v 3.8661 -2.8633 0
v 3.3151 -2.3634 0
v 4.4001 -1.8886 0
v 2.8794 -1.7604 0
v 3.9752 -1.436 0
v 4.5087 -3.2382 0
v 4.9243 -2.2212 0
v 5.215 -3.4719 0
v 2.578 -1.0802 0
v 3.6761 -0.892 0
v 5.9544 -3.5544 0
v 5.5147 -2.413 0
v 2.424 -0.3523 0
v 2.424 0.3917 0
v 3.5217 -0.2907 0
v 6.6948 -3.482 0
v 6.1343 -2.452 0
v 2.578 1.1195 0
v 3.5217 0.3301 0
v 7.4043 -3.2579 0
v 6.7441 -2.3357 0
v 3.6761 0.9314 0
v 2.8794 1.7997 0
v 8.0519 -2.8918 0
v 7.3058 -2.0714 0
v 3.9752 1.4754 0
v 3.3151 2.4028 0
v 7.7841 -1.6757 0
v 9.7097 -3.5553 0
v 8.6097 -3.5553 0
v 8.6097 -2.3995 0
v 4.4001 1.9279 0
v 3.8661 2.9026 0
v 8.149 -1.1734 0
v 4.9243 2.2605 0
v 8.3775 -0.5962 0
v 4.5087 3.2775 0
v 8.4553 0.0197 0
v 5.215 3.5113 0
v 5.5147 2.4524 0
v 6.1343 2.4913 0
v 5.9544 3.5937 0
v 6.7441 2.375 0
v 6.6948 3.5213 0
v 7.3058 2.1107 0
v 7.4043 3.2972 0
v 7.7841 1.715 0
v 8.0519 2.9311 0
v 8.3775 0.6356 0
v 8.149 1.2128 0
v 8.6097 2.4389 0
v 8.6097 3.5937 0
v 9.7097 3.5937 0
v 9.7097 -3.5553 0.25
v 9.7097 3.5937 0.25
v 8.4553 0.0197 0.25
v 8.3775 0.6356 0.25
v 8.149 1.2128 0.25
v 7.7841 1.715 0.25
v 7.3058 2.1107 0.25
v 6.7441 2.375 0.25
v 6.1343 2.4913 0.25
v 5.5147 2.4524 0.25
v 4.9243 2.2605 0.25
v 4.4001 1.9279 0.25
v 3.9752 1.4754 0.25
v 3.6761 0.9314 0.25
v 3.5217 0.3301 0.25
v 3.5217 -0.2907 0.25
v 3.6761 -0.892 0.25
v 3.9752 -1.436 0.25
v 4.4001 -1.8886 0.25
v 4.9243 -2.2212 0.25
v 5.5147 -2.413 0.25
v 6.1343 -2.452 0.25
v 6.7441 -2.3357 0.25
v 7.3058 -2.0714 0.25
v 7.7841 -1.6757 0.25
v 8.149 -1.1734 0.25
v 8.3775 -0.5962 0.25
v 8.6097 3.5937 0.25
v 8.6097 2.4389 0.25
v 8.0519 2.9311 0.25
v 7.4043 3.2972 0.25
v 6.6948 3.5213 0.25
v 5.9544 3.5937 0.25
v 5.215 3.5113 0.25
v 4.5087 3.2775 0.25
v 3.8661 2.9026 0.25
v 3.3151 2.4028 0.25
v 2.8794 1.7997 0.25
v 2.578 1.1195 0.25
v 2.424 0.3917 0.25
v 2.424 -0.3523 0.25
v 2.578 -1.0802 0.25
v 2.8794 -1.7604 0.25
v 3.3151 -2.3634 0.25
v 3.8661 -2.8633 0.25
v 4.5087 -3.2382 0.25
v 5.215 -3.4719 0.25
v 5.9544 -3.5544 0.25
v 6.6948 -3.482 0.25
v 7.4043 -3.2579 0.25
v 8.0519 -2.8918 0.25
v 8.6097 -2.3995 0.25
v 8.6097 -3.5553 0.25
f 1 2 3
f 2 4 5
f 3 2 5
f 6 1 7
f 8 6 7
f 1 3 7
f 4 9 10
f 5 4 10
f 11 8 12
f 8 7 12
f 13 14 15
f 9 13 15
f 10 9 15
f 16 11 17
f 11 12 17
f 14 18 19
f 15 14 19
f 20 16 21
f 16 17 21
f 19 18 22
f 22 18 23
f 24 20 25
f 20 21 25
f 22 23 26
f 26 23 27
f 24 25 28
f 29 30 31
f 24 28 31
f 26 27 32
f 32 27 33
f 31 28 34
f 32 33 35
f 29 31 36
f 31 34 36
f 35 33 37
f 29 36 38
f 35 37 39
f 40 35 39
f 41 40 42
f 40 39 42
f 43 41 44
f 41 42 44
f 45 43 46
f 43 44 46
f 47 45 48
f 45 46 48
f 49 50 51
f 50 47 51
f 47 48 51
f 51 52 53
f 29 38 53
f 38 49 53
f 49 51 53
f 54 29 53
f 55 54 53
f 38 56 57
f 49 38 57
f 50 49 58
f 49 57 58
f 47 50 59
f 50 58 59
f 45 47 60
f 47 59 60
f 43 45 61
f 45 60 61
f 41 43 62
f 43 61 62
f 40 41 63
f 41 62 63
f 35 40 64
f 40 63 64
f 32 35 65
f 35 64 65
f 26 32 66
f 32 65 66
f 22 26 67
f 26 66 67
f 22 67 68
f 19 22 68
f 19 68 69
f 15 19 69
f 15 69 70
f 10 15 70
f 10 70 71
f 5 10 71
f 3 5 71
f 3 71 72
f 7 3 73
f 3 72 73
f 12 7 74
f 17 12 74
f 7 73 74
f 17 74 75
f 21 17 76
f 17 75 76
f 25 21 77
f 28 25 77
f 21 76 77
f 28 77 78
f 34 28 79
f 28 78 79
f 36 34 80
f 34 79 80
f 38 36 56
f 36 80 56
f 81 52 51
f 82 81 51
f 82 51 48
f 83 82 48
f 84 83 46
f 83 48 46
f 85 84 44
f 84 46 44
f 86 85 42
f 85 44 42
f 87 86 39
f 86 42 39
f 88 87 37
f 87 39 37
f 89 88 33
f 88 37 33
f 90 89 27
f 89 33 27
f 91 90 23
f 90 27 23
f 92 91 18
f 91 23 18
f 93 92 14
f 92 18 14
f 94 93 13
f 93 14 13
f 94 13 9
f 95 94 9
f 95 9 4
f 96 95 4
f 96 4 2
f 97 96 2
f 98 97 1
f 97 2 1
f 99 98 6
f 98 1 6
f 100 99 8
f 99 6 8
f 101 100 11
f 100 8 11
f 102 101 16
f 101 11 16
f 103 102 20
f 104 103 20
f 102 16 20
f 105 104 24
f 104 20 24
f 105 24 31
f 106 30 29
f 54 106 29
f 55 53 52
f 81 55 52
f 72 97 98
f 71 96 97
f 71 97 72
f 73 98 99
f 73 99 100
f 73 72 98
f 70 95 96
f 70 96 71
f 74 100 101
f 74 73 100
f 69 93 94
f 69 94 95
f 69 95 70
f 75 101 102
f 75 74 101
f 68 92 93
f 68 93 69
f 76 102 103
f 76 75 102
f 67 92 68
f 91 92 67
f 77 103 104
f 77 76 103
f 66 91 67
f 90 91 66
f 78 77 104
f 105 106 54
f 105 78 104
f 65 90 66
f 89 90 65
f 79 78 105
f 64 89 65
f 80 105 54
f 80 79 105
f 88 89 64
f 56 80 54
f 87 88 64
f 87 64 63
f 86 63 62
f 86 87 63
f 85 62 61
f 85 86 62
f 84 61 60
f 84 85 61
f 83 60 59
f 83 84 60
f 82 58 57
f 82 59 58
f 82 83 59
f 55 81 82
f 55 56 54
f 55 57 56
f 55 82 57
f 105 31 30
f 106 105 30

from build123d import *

# Parameters (mm, degrees)
F0_R     = 2.474548
F1_DEPTH = 0.25
F2_DEPTH = 0.25
F3_R     = 2.476563
F4_DEPTH = 0.25


with BuildPart() as f1:
    # F0 (on Top) → F1 (new body)
    with BuildSketch(Plane.XY):
        with BuildLine():
            Line((8.609738, -2.39951), (8.609738, 2.438852))
            ThreePointArc((8.609738, 2.438852), (2.404608, 0.019671), (8.609738, -2.39951))
        make_face()
        with Locations((5.978753, 0.019671)):
            Circle(F0_R, mode=Mode.SUBTRACT)
        with Locations((5.978753, 0.019671)):
            Circle(F0_R)
        with BuildLine():
            ThreePointArc((8.609738, -2.39951), (9.308771, -1.278596), (9.552899, 0.019671))
            ThreePointArc((9.552899, 0.019671), (9.308771, 1.317938), (8.609738, 2.438852))
            Line((8.609738, 2.438852), (8.609738, -2.39951))
        make_face()
    extrude(amount=F1_DEPTH)

    # F0 (on Top) → F2 (join)
    with BuildSketch(Plane.XY):
        with BuildLine():
            ThreePointArc((8.609738, 2.438852), (9.308771, 1.317938), (9.552899, 0.019671))
            ThreePointArc((9.552899, 0.019671), (9.308771, -1.278596), (8.609738, -2.39951))
            Line((8.609738, -2.39951), (8.609738, -3.555269))
            Line((8.609738, -3.555269), (9.709738, -3.555269))
            Line((9.709738, -3.555269), (9.709738, 3.593735))
            Line((9.709738, 3.593735), (8.609738, 3.593735))
            Line((8.609738, 3.593735), (8.609738, 2.438852))
        make_face()
    extrude(amount=F2_DEPTH)

    # F3 (on face) → F4 (cut)
    with BuildSketch(Plane.XY.offset(0.25)):
        with Locations((5.978753, 0.019671)):
            Circle(F3_R)
    extrude(amount=-F4_DEPTH, mode=Mode.SUBTRACT)


solid = f1.part
